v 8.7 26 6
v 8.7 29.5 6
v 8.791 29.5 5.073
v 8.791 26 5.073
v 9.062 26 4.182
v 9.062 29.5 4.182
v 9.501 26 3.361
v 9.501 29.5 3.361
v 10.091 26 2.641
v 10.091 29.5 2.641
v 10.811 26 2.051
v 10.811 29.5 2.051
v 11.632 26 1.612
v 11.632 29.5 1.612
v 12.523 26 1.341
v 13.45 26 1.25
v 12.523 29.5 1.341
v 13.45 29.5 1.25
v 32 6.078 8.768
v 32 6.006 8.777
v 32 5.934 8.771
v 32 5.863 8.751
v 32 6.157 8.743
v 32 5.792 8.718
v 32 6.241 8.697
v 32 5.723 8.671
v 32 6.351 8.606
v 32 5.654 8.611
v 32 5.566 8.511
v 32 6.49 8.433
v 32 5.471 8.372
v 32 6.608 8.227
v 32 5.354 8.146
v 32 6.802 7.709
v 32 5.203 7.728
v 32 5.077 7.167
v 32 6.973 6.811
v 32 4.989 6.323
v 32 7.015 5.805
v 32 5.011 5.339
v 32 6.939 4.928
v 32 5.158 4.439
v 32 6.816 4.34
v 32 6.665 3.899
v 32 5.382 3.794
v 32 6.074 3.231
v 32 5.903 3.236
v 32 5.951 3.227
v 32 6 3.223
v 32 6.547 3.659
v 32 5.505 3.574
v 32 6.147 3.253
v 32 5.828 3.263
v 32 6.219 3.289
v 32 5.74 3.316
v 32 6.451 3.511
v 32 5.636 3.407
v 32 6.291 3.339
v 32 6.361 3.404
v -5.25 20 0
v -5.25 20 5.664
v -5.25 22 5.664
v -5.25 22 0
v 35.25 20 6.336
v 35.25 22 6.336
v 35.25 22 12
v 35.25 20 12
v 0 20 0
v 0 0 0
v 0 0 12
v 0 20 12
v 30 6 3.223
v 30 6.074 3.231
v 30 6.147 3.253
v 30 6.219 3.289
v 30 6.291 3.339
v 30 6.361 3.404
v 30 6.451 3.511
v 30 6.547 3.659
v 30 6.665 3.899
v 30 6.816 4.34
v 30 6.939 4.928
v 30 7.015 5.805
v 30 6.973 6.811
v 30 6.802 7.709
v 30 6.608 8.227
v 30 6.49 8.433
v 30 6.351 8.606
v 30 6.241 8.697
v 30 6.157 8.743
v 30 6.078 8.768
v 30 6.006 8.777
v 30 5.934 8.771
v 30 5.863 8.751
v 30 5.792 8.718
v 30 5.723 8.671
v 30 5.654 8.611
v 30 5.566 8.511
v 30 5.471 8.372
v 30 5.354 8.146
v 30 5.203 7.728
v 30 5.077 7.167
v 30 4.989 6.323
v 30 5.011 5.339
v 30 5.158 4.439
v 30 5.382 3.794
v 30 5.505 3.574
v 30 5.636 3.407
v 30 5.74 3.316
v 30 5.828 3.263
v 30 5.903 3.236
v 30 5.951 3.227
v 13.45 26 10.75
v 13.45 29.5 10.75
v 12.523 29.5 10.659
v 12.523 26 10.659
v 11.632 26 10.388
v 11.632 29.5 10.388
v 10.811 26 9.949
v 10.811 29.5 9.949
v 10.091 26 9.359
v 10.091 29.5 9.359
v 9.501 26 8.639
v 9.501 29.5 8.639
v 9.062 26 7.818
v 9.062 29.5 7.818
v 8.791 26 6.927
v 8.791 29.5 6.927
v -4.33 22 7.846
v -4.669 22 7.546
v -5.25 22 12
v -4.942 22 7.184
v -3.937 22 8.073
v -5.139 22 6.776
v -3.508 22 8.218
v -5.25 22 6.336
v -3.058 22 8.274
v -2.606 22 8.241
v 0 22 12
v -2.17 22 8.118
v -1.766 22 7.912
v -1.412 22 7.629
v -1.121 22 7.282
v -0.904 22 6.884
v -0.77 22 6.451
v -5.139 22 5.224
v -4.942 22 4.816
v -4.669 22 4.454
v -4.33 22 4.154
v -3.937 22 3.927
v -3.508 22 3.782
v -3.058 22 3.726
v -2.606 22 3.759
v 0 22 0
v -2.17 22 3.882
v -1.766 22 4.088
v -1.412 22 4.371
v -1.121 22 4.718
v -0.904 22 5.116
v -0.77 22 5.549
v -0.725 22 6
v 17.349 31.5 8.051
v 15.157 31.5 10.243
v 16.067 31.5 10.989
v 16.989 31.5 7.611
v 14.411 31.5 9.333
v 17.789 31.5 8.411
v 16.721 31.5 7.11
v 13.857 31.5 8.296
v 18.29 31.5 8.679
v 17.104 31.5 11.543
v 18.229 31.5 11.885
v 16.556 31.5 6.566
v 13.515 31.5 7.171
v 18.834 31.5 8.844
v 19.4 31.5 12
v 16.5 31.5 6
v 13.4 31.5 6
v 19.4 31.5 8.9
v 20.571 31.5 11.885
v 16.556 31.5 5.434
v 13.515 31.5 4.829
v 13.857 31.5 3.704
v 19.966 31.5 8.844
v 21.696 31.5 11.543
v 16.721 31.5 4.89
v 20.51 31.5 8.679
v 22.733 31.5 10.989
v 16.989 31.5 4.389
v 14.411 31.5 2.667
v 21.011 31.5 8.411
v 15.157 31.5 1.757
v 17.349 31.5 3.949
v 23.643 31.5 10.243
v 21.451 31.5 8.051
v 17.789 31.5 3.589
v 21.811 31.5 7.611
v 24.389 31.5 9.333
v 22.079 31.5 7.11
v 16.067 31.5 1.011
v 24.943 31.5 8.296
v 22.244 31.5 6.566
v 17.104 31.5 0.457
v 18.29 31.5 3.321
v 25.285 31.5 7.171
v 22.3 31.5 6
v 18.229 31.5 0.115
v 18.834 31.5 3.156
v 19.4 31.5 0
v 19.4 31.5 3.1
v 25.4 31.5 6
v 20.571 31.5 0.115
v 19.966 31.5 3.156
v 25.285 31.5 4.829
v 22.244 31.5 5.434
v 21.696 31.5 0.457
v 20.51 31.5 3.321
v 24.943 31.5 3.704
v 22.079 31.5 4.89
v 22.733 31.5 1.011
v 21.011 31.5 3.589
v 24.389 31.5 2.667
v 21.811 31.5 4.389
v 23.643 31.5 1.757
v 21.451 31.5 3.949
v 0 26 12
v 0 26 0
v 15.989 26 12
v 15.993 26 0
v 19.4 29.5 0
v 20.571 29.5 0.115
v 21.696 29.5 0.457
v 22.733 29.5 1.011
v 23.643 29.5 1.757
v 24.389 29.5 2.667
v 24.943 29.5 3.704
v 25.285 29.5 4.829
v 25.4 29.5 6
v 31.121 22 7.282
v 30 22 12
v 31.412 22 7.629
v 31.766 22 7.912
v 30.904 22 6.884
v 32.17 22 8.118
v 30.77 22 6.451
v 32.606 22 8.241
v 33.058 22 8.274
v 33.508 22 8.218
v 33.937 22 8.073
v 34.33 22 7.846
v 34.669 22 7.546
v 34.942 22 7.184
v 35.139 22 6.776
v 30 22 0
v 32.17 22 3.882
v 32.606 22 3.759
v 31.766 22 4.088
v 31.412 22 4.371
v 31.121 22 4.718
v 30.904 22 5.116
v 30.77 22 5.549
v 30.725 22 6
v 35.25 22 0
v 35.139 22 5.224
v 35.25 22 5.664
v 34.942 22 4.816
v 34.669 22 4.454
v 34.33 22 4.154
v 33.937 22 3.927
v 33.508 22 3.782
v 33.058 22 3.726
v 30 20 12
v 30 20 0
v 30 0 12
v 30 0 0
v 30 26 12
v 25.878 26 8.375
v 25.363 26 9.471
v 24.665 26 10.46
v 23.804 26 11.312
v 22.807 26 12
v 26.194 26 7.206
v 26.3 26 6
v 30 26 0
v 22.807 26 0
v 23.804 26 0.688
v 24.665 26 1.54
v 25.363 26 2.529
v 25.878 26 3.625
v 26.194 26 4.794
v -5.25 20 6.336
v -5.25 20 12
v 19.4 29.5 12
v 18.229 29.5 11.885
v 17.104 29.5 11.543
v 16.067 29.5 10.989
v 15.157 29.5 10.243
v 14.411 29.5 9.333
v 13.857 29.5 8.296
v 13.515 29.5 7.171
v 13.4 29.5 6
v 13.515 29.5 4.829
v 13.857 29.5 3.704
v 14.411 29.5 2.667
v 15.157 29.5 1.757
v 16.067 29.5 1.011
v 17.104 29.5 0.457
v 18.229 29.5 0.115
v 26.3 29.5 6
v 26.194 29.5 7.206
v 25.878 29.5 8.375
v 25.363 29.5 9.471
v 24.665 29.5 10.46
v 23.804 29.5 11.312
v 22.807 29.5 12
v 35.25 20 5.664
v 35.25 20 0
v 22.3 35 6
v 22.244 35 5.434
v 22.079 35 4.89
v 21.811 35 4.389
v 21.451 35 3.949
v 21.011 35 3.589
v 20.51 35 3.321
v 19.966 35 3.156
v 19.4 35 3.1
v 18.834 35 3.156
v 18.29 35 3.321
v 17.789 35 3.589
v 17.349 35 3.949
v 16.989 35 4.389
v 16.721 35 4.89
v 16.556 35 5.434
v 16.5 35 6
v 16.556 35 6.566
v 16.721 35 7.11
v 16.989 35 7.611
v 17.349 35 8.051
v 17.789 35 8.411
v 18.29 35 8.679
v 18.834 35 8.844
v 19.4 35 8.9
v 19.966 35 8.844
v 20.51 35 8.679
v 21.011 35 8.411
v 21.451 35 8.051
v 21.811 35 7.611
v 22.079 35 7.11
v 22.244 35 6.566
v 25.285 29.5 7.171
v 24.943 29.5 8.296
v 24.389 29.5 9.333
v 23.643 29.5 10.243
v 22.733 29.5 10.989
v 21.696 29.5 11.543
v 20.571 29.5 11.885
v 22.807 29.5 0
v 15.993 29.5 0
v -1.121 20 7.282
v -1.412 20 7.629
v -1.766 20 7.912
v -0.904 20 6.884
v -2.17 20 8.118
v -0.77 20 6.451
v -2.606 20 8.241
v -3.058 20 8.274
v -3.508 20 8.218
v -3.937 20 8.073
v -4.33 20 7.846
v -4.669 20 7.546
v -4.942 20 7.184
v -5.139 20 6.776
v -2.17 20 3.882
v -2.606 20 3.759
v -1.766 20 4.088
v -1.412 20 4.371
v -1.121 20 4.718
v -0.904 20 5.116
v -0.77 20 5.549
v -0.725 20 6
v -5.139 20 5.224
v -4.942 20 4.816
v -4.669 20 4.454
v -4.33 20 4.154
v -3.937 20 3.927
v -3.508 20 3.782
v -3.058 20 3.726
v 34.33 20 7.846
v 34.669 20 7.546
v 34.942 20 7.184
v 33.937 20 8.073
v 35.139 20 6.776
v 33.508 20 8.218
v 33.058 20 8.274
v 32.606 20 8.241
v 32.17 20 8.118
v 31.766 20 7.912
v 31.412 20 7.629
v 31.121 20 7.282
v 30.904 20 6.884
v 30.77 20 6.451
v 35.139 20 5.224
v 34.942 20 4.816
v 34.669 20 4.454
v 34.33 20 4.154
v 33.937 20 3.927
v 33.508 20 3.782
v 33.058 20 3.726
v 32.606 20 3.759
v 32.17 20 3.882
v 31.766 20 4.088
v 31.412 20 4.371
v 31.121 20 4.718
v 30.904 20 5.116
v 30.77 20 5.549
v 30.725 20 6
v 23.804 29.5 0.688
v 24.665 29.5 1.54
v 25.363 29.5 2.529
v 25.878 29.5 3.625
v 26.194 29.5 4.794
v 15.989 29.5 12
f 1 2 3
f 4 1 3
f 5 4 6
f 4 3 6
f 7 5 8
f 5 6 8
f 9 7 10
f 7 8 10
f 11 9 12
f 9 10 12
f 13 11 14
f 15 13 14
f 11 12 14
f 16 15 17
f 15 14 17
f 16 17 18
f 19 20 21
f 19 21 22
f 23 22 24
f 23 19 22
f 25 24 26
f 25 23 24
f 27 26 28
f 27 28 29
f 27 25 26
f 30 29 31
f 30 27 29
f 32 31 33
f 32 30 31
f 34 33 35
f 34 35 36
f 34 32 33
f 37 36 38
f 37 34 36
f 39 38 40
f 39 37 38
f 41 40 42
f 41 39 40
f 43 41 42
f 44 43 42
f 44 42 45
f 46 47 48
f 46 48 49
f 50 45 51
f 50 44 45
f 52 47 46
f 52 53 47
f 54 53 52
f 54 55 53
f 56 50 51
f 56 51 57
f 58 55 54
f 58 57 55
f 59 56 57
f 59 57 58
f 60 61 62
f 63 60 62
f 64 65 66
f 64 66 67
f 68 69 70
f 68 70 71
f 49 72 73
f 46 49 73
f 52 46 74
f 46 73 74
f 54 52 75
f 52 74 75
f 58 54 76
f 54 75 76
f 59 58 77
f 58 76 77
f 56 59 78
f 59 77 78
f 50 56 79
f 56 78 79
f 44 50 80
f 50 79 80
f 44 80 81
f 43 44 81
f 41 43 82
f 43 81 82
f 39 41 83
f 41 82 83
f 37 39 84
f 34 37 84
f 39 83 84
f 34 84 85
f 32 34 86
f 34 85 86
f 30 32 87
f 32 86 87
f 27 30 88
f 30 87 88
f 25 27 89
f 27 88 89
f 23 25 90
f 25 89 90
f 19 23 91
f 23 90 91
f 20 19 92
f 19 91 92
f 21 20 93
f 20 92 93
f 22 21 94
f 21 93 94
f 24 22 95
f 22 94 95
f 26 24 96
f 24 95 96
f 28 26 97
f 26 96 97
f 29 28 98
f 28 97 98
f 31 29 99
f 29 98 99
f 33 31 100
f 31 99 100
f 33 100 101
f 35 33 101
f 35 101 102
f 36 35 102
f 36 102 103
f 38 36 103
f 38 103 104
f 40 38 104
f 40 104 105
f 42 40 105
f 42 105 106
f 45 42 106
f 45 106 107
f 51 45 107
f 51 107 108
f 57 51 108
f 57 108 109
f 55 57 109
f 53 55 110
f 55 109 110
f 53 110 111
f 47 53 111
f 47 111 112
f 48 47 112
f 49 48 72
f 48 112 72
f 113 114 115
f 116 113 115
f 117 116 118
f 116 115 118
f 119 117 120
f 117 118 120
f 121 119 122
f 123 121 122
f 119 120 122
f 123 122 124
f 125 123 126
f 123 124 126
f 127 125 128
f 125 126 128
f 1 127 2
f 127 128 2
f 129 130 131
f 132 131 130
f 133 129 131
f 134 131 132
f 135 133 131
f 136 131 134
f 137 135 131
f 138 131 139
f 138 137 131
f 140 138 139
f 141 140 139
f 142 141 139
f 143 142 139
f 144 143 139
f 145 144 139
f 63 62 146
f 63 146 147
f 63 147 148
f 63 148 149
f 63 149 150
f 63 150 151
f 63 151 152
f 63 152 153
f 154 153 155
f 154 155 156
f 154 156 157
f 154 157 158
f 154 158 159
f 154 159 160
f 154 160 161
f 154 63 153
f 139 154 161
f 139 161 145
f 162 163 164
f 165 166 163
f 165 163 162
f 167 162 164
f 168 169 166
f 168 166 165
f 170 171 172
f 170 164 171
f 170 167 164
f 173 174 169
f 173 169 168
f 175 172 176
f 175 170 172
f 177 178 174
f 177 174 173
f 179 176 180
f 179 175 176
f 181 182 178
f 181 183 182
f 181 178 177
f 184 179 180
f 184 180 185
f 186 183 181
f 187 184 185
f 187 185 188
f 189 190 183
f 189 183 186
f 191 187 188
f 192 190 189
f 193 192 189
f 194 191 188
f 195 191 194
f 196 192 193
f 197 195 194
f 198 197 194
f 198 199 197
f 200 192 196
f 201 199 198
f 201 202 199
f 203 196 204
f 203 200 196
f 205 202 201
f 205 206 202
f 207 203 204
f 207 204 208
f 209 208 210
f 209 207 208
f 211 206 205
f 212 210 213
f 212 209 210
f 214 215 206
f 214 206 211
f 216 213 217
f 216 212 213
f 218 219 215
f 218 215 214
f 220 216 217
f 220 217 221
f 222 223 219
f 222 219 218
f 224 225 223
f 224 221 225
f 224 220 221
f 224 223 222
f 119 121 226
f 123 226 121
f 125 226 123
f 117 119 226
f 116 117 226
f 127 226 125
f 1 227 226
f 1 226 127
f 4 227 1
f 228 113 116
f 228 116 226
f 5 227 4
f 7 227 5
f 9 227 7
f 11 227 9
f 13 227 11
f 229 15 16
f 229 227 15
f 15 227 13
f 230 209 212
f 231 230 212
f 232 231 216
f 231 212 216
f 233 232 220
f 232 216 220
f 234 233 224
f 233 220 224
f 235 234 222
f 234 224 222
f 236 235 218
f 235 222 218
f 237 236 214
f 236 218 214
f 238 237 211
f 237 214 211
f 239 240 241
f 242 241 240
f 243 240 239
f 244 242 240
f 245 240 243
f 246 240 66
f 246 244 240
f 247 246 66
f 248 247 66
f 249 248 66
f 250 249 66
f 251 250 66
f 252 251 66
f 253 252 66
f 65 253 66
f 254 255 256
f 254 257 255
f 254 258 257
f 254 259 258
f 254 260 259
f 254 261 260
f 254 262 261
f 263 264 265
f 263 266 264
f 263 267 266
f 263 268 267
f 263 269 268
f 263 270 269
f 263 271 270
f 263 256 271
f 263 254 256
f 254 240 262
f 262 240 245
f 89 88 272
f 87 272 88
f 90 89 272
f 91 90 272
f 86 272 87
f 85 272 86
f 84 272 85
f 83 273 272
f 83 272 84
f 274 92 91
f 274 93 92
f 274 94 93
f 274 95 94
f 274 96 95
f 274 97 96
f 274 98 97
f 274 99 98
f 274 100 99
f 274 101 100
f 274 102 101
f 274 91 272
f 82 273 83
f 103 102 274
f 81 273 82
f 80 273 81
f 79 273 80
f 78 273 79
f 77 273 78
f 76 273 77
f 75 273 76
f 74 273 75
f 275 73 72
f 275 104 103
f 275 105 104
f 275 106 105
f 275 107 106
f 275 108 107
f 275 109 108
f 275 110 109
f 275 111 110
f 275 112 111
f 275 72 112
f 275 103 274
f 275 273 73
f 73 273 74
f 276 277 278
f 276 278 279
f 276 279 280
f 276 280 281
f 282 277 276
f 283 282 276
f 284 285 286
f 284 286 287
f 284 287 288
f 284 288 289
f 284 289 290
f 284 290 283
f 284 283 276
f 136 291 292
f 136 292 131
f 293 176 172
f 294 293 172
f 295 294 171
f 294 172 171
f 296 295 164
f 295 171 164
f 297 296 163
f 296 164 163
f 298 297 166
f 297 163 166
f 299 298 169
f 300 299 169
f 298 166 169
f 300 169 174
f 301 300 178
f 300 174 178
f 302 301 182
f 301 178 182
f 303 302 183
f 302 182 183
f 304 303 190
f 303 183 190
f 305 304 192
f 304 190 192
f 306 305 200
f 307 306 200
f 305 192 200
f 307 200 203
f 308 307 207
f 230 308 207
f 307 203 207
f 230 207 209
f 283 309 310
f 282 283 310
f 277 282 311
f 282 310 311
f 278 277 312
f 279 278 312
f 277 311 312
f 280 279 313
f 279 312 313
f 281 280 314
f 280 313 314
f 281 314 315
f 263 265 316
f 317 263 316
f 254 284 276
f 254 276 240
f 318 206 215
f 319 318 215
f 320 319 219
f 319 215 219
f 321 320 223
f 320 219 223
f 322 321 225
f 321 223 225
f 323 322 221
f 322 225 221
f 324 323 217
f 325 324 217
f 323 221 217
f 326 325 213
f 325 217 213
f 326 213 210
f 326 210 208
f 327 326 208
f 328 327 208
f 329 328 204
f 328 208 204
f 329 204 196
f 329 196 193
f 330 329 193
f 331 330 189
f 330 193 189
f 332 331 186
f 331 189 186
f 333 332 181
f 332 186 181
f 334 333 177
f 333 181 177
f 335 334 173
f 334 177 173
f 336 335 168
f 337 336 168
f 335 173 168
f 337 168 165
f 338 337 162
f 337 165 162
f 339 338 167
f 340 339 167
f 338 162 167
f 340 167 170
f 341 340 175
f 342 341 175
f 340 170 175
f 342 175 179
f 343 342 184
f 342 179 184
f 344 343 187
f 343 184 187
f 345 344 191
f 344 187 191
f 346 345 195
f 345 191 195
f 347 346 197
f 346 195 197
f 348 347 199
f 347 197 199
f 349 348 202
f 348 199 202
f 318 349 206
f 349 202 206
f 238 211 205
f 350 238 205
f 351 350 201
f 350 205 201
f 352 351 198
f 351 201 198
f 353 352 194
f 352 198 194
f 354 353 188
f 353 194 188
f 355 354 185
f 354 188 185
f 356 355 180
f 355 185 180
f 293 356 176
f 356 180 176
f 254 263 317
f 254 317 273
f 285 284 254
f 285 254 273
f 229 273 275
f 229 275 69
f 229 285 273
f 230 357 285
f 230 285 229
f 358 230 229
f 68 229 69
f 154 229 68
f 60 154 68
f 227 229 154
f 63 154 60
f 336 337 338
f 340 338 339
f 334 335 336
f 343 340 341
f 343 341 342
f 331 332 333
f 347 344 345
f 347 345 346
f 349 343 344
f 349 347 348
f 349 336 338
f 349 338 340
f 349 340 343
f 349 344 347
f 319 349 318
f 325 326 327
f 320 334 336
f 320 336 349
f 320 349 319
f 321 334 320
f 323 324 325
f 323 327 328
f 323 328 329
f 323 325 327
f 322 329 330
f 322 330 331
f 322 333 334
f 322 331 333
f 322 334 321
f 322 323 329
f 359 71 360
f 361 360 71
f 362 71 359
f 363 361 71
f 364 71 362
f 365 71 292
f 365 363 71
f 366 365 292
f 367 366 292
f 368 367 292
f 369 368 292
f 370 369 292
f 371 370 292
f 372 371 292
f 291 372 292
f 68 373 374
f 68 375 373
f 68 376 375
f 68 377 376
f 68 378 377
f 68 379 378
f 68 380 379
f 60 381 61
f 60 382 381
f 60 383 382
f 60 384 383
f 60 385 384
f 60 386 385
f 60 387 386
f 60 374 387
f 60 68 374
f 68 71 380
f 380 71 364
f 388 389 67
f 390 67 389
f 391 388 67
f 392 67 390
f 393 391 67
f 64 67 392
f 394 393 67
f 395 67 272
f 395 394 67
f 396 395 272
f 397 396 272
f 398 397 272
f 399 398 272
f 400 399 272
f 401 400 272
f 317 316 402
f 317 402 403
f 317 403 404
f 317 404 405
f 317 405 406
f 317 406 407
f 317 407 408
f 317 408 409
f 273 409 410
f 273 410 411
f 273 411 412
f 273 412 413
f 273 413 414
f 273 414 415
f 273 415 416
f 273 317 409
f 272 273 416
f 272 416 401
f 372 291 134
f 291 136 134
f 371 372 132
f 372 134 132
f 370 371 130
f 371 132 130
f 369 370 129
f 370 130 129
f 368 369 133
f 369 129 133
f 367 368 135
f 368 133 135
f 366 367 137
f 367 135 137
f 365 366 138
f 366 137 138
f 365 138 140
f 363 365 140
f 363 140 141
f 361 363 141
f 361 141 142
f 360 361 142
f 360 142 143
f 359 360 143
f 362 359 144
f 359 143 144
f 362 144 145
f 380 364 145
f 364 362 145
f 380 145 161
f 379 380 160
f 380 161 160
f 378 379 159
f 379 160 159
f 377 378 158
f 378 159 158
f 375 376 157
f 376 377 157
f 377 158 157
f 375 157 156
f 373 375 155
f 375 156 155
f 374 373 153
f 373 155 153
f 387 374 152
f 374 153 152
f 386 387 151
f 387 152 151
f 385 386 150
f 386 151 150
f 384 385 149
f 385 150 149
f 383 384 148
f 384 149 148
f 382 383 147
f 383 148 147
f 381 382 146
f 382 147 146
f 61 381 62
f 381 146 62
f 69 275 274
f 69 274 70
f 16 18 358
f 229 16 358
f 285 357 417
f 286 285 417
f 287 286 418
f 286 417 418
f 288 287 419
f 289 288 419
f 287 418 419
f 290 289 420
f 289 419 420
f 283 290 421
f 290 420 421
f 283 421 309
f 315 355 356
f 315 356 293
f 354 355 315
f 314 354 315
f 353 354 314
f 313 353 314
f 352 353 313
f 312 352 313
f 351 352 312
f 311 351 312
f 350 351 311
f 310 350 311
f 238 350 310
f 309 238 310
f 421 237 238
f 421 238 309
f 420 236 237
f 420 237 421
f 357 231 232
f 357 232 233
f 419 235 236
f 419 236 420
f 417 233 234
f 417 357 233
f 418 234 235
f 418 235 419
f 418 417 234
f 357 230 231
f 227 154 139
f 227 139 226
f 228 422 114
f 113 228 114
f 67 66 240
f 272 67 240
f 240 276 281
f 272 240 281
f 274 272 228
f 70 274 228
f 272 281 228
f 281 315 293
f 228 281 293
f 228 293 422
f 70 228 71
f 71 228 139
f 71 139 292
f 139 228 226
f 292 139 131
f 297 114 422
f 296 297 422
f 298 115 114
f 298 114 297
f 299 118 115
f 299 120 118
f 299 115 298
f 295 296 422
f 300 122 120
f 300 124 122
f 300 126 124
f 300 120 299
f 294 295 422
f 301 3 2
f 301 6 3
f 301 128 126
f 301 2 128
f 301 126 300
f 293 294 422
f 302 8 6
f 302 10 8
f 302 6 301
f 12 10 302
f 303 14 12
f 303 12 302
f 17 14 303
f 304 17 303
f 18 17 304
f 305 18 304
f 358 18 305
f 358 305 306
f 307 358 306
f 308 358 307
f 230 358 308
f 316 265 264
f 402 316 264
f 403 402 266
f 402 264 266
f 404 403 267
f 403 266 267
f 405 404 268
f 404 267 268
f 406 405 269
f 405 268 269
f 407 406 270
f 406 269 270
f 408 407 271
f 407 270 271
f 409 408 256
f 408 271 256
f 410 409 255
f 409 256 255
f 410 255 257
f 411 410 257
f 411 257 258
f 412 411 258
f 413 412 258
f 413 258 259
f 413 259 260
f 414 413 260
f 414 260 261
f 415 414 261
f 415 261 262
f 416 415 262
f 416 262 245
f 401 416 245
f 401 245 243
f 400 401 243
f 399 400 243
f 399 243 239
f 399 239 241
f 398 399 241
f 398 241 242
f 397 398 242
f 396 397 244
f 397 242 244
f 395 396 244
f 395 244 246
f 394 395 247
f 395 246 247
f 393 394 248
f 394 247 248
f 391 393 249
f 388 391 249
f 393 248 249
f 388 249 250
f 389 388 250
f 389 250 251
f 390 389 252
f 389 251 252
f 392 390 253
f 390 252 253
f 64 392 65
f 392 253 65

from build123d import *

# Parameters (mm, degrees)
BOSS_EXTRUDE1_DEPTH = 12
SKETCH2_RX          = 2.776601092
SKETCH2_RY          = 1.017784095
BOSS_EXTRUDE2_DEPTH = 2
SKETCH3_R           = 2.275
CUT_EXTRUDE3_DEPTH  = 2
SKETCH5_R           = 2.9
BOSS_EXTRUDE3_DEPTH = 3.5
CUT_EXTRUDE4_DEPTH  = 5.5
CUT_EXTRUDE5_DEPTH  = 2
CUT_EXTRUDE6_DEPTH  = 3.5


with BuildPart() as part:
    # Sketch1 → Boss-Extrude1 (new body)
    with BuildSketch(Plane.XY):
        Polygon((0, 22), (0, 26), (8.7, 26), (8.7, 31.5), (26.3, 31.5), (26.3, 26), (30, 26), (30, 22), (35.25, 22), (35.25, 20), (30, 20), (30, 0), (0, 0), (0, 20), (-5.25, 20), (-5.25, 22), align=None)
    extrude(amount=BOSS_EXTRUDE1_DEPTH)

    # Sketch2 → Boss-Extrude2 (add)
    with BuildSketch(Plane(origin=(30, 0, 0), x_dir=(0, 0, -1), z_dir=(1, 0, 0))):
        with Locations((-6, 6)):
            Ellipse(SKETCH2_RX, SKETCH2_RY)
    extrude(amount=BOSS_EXTRUDE2_DEPTH)

    # Sketch3 → Cut-Extrude3 (cut)
    with BuildSketch(Plane(origin=(0, 22, 0), x_dir=(1, 0, 0), z_dir=(0, 1, 0))):
        with Locations((-3, -6)):
            Circle(SKETCH3_R)
        with Locations((33, -6)):
            Circle(SKETCH3_R)
    extrude(amount=-CUT_EXTRUDE3_DEPTH, mode=Mode.SUBTRACT)

    # Sketch5 → Boss-Extrude3 (add)
    with BuildSketch(Plane(origin=(0, 31.5, 0), x_dir=(1, 0, 0), z_dir=(0, 1, 0))):
        with Locations((19.4, -6)):
            Circle(SKETCH5_R)
    extrude(amount=BOSS_EXTRUDE3_DEPTH)

    # Sketch5<3> → Cut-Extrude4 (cut)
    with BuildSketch(Plane(origin=(0, 31.5, 0), x_dir=(1, 0, 0), z_dir=(0, 1, 0))):
        with BuildLine():
            Line((26.3, 0), (22.807345007, 0))
            ThreePointArc((22.807345007, 0), (25.363249137, -2.528738021), (26.3, -6))
            Line((26.3, -6), (26.3, 0))
        make_face()
        with BuildLine():
            Line((26.3, -12), (26.3, -6))
            ThreePointArc((26.3, -6), (25.363249137, -9.471261979), (22.807345007, -12))
            Line((22.807345007, -12), (26.3, -12))
        make_face()
    extrude(amount=-CUT_EXTRUDE4_DEPTH, mode=Mode.SUBTRACT)

    # Sketch7 → Cut-Extrude5 (cut)
    with BuildSketch(Plane(origin=(0, 31.5, 0), x_dir=(1, 0, 0), z_dir=(0, 1, 0))):
        with BuildLine():
            ThreePointArc((22.807345007, -12), (26.3, -6), (22.807345007, 0))
            Line((22.807345007, 0), (19.4, 0))
            ThreePointArc((19.4, 0), (23.642640687, -1.757359313), (25.4, -6))
            ThreePointArc((25.4, -6), (23.642640687, -10.242640687), (19.4, -12))
            Line((19.4, -12), (22.807345007, -12))
        make_face()
        with BuildLine():
            ThreePointArc((19.4, -12), (13.4, -6), (19.4, 0))
            Line((19.4, 0), (8.7, 0))
            Line((8.7, 0), (8.7, -12))
            Line((8.7, -12), (19.4, -12))
        make_face()
    extrude(amount=-CUT_EXTRUDE5_DEPTH, mode=Mode.SUBTRACT)

    # Sketch8 → Cut-Extrude6 (cut)
    with BuildSketch(Plane(origin=(0, 29.5, 0), x_dir=(1, 0, 0), z_dir=(0, 1, 0))):
        with BuildLine():
            Line((8.7, 0), (8.7, -6))
            ThreePointArc((8.7, -6), (10.091242789, -2.641242789), (13.45, -1.25))
            Line((13.45, -1.25), (15.992654993, 0))
            Line((15.992654993, 0), (8.7, 0))
        make_face()
        with BuildLine():
            Line((15.988961876, -12), (13.45, -10.75))
            ThreePointArc((13.45, -10.75), (10.091242789, -9.358757211), (8.7, -6))
            Line((8.7, -6), (8.7, -12))
            Line((8.7, -12), (15.988961876, -12))
        make_face()
    extrude(amount=-CUT_EXTRUDE6_DEPTH, mode=Mode.SUBTRACT)


solid = part.part
